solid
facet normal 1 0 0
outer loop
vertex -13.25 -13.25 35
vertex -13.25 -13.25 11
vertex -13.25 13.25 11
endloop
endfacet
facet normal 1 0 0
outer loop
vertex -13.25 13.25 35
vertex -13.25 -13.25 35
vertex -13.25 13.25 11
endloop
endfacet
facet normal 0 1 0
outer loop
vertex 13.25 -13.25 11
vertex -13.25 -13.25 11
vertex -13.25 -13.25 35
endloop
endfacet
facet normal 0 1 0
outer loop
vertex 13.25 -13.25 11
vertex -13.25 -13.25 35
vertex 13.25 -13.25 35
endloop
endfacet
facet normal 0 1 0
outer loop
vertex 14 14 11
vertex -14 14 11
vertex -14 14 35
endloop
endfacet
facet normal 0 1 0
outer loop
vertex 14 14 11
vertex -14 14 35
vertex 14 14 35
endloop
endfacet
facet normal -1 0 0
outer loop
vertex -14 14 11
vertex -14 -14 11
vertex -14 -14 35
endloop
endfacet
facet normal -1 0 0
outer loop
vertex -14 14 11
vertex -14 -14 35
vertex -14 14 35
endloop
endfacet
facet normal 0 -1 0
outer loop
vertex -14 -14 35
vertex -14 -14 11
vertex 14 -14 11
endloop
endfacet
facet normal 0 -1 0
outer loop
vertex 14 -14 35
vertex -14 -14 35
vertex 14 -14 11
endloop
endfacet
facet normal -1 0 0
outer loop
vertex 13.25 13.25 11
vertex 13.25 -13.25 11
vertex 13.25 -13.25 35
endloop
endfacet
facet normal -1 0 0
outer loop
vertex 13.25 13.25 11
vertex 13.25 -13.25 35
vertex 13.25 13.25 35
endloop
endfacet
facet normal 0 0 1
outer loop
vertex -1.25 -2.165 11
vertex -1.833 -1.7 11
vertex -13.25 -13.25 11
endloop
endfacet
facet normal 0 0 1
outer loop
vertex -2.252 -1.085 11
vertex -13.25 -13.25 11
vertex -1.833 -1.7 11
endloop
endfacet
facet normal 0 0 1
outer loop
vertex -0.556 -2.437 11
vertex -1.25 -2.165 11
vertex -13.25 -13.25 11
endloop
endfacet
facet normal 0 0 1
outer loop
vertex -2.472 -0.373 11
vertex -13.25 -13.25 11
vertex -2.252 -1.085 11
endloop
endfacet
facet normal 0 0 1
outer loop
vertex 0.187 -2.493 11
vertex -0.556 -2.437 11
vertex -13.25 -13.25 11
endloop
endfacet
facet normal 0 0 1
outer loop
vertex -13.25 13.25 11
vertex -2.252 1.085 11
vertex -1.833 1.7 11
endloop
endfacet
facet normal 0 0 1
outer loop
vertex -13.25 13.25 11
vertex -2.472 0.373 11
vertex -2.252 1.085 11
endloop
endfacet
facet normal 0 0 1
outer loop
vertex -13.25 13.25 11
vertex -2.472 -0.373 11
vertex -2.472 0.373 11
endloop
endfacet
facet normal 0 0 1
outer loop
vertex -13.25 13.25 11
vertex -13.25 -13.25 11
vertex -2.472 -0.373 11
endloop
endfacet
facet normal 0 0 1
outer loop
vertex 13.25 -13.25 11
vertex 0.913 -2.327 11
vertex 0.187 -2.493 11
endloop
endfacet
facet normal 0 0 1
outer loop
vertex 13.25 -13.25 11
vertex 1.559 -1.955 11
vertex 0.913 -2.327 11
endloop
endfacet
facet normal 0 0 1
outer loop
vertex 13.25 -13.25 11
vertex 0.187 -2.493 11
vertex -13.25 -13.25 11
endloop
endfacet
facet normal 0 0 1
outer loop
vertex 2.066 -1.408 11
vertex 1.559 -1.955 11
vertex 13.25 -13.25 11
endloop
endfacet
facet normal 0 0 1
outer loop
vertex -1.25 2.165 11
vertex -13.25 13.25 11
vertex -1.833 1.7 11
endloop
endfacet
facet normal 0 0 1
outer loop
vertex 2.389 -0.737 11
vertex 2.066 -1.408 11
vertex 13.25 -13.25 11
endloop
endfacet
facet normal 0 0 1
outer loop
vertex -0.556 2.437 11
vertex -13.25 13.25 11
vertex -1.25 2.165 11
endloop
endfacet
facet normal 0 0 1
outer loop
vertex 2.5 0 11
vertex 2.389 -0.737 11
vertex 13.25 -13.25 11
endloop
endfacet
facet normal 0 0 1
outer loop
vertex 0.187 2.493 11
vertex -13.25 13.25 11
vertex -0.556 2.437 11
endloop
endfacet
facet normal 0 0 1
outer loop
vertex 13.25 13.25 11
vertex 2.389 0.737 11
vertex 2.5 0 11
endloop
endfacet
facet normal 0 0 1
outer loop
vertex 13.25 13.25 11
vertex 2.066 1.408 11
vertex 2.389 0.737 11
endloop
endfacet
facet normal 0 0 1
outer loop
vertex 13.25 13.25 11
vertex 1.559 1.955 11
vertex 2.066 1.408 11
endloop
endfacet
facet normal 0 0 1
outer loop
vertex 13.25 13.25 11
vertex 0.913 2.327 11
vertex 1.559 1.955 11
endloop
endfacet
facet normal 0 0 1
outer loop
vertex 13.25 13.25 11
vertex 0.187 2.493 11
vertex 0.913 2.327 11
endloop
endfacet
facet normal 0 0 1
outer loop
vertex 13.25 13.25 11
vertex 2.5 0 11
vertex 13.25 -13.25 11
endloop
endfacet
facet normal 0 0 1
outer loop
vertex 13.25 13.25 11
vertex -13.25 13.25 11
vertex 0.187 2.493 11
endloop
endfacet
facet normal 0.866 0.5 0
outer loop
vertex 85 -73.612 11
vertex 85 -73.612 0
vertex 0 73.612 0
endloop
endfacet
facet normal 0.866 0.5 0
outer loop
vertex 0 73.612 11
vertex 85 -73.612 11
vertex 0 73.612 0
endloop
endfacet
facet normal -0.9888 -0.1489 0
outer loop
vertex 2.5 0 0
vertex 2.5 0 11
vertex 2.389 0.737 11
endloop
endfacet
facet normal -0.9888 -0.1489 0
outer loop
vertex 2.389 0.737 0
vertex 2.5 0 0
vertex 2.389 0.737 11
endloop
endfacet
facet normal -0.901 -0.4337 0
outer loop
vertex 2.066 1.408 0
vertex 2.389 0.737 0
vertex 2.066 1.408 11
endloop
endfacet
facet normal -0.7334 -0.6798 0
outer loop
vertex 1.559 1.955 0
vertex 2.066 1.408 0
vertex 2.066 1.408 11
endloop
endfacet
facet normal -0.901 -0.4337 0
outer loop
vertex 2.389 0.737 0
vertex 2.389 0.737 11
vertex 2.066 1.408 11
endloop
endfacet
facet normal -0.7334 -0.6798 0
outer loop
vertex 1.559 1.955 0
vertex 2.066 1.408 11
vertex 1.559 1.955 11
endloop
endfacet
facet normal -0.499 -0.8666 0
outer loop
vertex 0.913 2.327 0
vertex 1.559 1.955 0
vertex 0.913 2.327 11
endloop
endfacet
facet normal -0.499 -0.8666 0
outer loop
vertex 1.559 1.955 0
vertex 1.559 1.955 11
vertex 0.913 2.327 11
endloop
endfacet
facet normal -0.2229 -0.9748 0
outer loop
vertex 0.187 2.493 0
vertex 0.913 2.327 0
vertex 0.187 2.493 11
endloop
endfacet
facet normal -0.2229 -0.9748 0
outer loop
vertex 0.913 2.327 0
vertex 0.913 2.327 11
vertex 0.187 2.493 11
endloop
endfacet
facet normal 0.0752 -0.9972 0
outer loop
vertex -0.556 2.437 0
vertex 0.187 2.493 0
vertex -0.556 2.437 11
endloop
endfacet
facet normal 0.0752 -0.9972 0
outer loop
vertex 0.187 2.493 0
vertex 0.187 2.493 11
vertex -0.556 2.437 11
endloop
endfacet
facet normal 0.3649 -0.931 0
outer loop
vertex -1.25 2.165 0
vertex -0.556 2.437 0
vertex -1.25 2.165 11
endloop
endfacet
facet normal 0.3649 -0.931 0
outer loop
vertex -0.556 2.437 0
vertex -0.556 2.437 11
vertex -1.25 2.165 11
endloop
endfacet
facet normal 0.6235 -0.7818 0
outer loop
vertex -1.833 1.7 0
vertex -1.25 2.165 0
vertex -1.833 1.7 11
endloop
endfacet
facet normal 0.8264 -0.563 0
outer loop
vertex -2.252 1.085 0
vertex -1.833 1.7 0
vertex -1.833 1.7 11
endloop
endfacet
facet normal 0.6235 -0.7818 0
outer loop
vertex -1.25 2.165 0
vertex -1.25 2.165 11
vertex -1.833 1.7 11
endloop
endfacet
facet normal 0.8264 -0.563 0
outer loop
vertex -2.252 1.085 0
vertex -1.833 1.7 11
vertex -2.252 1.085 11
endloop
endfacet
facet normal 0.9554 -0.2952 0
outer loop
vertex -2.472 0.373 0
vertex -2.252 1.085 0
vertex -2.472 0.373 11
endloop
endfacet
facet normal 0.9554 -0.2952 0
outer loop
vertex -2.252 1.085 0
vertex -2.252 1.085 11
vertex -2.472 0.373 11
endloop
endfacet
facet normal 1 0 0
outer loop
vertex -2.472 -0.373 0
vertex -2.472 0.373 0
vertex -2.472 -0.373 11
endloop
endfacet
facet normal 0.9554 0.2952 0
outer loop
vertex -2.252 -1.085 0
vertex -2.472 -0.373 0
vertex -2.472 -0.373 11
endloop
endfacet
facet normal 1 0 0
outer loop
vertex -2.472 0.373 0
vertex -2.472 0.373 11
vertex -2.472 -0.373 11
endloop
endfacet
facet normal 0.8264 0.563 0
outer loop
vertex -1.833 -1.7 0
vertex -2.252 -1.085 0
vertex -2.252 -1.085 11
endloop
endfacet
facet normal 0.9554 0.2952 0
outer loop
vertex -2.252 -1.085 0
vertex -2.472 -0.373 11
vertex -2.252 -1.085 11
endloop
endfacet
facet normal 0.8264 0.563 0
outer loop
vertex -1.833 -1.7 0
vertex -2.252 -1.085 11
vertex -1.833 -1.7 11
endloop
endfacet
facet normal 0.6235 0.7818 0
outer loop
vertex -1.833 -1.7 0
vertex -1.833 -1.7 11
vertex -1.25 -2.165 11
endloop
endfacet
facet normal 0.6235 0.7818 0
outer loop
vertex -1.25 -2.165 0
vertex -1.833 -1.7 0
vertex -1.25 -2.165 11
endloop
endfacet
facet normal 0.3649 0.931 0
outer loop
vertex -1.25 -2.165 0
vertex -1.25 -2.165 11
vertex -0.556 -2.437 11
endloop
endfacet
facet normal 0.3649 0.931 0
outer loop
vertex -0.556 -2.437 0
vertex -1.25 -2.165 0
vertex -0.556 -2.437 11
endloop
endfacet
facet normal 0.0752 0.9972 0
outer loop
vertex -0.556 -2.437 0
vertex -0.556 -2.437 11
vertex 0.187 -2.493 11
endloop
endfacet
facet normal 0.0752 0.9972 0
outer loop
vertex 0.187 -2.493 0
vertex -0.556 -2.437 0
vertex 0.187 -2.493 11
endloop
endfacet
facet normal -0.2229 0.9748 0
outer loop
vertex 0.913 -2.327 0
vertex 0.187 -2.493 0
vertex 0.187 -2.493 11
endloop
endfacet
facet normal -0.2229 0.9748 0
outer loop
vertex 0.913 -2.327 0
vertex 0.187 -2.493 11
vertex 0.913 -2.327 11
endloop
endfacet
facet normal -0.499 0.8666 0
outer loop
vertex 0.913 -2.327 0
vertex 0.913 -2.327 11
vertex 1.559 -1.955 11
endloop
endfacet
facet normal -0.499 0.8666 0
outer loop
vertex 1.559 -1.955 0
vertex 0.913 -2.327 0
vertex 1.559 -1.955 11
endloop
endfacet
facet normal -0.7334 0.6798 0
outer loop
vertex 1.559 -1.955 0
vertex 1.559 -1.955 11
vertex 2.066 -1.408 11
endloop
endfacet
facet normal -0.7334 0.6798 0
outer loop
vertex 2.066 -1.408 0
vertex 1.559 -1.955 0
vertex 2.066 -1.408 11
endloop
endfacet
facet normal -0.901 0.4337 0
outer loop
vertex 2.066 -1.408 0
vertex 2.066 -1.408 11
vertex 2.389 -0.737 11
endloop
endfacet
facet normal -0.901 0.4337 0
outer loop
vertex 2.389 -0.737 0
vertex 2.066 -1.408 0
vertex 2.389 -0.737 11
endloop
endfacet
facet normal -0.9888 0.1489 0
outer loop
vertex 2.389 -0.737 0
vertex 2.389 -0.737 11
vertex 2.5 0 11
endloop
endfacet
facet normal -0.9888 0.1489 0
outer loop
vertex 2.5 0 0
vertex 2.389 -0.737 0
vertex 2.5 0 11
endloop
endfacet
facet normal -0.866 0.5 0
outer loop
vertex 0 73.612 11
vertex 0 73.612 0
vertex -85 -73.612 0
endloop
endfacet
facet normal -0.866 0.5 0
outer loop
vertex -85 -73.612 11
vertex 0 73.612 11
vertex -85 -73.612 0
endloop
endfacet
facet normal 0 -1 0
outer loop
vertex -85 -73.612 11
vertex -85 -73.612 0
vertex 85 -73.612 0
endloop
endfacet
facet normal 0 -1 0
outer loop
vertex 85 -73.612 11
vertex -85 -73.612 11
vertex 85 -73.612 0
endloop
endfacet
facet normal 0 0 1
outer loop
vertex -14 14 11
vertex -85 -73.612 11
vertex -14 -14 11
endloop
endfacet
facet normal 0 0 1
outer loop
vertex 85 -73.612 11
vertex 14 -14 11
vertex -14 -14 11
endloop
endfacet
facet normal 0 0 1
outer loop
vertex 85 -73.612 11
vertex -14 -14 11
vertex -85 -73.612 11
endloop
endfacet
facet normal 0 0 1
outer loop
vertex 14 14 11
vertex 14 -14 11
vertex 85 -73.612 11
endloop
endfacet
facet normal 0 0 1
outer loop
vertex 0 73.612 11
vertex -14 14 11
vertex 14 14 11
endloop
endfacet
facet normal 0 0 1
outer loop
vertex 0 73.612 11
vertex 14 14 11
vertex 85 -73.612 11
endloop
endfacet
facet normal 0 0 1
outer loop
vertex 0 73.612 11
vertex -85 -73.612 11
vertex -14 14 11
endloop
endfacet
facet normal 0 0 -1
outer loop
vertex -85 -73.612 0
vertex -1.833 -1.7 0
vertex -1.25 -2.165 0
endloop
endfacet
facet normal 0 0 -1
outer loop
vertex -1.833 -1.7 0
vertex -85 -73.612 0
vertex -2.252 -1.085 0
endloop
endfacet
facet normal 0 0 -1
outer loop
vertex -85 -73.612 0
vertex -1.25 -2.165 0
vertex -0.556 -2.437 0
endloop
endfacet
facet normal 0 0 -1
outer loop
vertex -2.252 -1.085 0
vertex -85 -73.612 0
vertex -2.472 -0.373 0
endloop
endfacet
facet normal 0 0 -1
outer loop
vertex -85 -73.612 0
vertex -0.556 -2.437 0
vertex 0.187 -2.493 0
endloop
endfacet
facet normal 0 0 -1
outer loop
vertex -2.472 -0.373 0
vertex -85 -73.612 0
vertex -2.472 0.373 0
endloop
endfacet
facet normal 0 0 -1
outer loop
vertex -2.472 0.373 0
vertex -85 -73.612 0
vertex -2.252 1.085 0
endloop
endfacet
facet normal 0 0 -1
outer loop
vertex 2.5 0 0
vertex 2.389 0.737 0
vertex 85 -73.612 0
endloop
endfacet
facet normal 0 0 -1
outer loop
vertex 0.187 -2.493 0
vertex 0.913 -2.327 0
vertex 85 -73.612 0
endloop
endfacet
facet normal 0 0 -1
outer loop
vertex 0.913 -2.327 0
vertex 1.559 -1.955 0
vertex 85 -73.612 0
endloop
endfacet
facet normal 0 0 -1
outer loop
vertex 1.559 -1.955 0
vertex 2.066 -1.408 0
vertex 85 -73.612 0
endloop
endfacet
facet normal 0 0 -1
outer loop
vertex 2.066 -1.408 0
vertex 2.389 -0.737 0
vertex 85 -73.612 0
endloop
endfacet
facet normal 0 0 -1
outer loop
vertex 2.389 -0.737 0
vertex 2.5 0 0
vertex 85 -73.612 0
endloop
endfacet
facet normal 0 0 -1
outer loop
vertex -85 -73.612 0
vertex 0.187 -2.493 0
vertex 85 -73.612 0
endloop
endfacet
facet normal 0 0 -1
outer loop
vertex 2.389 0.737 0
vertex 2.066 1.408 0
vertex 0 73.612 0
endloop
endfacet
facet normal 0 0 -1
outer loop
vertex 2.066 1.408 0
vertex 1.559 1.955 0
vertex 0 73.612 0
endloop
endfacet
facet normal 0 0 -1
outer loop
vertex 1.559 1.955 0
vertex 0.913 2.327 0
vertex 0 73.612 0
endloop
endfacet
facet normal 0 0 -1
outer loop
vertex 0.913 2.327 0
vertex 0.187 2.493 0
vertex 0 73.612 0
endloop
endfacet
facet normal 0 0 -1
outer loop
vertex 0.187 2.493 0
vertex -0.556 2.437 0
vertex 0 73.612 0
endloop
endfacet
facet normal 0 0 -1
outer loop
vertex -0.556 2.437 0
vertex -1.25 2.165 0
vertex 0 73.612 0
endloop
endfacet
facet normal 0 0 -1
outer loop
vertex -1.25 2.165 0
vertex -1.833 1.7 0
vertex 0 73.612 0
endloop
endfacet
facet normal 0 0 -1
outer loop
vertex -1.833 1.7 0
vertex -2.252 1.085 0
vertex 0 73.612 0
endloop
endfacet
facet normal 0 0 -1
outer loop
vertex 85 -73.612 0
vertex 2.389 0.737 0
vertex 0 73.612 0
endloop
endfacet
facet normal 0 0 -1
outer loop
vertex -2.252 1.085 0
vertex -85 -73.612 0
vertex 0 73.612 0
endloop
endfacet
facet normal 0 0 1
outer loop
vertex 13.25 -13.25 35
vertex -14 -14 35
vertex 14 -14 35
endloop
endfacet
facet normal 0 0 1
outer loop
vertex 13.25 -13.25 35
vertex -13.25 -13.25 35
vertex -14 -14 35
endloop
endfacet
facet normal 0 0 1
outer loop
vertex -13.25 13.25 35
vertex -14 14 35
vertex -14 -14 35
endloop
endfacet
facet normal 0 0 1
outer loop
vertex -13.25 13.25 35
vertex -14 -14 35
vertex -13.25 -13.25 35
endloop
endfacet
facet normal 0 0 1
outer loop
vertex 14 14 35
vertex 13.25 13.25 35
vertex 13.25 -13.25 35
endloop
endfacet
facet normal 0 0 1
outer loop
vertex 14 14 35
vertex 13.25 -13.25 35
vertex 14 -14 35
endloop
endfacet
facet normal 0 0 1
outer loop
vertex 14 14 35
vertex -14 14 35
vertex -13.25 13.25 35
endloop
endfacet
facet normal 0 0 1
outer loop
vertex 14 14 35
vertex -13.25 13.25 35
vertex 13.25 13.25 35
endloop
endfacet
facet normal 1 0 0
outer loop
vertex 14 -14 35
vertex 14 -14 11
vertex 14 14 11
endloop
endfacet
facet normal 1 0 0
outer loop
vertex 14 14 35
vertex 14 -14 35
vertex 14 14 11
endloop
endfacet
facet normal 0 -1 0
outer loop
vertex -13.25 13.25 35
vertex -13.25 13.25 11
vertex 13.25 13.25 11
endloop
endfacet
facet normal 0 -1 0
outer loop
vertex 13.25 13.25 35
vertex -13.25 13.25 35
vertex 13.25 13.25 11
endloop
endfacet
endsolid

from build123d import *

# Parameters (mm, degrees)
F1_DEPTH = 11
F3_W     = 28
F3_H     = 28
F4_DEPTH = 24
F2_W     = 26.5
F2_H     = 26.5
F5_DEPTH = 24
F6_R     = 2.5
F7_DEPTH = 25


with BuildPart() as f1:
    # F0 (on Top) → F1 (new body)
    with BuildSketch(Plane.XY):
        Polygon((0, 73.612159), (-85, -73.612159), (0, -73.612159), align=None)
        Polygon((0, 73.612159), (0, -73.612159), (85, -73.612159), align=None)
    extrude(amount=F1_DEPTH)

    # F3 (on face) → F4 (join)
    with BuildSketch(Plane.XY.offset(11)):
        Rectangle(F3_W, F3_H)
    extrude(amount=F4_DEPTH)

    # F2 (on face) → F5 (cut)
    with BuildSketch(Plane.XY.offset(11)):
        Rectangle(F2_W, F2_H)
    extrude(amount=F5_DEPTH, mode=Mode.SUBTRACT)

    # F6 (on face) → F7 (cut)
    with BuildSketch(Plane.XY.offset(11)):
        Circle(F6_R)
    extrude(amount=-F7_DEPTH, mode=Mode.SUBTRACT)


solid = f1.part
